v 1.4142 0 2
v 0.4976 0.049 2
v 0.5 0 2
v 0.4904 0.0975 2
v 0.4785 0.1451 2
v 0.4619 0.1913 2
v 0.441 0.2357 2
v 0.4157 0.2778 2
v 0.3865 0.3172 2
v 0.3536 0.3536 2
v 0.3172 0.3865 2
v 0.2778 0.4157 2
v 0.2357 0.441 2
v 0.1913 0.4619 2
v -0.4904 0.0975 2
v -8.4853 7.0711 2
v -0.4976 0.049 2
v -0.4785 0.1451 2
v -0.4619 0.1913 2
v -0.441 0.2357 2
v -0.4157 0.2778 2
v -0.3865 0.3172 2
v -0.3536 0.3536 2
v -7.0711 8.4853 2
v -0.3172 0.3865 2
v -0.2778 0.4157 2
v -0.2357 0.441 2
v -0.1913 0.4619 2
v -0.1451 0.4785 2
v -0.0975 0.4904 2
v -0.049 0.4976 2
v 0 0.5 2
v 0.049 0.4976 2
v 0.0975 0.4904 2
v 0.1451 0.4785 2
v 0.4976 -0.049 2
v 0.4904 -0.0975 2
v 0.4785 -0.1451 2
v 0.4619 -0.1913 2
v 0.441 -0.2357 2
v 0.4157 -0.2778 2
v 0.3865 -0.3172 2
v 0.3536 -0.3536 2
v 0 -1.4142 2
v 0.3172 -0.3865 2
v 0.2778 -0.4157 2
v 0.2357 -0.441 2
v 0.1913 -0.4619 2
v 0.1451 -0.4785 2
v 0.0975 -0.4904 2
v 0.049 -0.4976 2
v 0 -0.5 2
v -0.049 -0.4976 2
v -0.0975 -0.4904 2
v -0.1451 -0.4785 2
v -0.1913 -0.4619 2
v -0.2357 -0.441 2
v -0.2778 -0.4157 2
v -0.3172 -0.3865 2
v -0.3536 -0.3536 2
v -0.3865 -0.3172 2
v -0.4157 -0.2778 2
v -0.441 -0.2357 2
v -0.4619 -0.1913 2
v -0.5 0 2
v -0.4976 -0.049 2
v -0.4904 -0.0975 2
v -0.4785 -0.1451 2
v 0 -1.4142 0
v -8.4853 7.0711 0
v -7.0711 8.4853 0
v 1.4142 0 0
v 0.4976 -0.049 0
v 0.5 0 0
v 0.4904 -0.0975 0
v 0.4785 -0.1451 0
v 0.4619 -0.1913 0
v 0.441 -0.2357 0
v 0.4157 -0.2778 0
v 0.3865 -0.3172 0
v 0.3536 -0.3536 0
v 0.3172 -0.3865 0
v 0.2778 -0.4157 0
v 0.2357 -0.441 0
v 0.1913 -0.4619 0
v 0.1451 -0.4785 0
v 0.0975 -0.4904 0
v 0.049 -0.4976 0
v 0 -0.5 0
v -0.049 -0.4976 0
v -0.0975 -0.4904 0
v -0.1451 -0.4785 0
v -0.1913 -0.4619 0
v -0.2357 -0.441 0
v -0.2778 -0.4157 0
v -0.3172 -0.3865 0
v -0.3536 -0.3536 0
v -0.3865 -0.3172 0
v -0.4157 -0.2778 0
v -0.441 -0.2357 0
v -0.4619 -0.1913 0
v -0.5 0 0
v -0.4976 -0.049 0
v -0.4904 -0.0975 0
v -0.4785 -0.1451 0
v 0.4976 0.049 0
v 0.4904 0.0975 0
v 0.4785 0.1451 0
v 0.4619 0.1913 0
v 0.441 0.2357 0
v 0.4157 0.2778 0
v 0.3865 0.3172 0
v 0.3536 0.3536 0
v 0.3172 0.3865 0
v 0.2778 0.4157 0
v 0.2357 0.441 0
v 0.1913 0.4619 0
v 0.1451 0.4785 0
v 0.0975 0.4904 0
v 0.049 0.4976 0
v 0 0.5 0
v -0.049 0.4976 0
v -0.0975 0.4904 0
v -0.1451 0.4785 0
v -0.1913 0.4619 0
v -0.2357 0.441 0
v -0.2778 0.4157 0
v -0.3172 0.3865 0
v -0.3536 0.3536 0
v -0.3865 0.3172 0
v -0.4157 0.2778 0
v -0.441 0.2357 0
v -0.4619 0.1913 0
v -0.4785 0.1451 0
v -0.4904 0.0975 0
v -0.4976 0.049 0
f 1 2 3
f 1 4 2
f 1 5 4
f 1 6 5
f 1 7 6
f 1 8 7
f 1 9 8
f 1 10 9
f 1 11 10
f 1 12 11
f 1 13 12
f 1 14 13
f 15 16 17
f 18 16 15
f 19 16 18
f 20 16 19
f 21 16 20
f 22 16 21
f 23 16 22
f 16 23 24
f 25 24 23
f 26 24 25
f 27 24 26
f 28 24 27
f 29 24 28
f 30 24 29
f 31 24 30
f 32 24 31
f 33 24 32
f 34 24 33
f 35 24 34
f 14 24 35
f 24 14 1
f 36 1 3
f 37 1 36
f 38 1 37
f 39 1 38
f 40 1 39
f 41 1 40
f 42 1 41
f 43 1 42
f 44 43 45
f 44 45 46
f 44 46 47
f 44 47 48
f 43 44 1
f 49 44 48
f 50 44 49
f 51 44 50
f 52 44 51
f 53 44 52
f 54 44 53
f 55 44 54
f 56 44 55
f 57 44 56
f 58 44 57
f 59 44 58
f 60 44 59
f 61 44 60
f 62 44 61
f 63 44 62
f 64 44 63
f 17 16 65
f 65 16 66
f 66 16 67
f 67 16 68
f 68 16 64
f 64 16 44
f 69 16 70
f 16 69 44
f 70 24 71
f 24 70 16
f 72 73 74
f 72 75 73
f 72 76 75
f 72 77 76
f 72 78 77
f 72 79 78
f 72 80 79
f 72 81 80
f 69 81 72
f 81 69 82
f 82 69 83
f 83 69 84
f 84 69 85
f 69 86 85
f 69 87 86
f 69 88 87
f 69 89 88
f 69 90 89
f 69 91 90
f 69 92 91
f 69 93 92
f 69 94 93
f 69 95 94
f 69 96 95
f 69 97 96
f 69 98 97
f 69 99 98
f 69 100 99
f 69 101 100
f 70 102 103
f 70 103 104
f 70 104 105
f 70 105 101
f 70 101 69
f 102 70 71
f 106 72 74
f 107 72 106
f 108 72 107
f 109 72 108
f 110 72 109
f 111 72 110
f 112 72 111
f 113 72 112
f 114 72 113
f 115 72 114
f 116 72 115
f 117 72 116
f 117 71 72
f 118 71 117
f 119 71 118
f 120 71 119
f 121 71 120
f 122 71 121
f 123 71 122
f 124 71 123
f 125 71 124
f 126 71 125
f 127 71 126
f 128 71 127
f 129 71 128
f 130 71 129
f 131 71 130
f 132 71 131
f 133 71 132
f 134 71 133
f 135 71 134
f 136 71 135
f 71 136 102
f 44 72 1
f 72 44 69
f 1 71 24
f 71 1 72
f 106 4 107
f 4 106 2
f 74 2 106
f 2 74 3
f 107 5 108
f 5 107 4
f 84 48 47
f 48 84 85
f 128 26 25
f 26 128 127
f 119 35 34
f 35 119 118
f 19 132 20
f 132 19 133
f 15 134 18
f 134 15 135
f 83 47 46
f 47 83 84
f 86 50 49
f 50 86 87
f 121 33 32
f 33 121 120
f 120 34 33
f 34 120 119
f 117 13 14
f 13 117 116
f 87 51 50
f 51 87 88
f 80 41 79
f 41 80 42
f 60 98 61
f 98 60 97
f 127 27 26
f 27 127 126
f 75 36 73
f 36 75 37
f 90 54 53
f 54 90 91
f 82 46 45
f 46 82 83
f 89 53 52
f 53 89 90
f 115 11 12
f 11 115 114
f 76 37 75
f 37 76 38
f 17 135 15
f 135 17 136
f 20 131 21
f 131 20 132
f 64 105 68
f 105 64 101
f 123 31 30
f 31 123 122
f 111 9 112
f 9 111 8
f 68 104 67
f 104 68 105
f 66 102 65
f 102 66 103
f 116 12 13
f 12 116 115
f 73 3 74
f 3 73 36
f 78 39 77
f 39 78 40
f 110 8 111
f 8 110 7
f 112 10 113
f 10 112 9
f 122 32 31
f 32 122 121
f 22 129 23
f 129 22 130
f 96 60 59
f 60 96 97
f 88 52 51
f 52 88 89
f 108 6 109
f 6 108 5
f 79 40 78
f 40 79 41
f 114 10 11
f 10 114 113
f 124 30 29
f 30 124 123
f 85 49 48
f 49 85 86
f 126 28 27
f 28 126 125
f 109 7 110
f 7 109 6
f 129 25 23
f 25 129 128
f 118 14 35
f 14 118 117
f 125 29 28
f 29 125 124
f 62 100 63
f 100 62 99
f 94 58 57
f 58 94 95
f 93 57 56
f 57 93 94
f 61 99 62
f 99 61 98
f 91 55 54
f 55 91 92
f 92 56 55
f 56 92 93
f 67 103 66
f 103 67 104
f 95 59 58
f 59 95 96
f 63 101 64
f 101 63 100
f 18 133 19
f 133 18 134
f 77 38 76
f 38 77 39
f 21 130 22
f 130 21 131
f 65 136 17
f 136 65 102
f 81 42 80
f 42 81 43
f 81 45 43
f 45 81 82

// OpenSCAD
difference() {
    rotate([0,0,45]) {
        translate([-1,-1,0]) {
            cube([2,12,2]);
        }
    }
    cylinder(d=1, h=12, $fn=64);
}
